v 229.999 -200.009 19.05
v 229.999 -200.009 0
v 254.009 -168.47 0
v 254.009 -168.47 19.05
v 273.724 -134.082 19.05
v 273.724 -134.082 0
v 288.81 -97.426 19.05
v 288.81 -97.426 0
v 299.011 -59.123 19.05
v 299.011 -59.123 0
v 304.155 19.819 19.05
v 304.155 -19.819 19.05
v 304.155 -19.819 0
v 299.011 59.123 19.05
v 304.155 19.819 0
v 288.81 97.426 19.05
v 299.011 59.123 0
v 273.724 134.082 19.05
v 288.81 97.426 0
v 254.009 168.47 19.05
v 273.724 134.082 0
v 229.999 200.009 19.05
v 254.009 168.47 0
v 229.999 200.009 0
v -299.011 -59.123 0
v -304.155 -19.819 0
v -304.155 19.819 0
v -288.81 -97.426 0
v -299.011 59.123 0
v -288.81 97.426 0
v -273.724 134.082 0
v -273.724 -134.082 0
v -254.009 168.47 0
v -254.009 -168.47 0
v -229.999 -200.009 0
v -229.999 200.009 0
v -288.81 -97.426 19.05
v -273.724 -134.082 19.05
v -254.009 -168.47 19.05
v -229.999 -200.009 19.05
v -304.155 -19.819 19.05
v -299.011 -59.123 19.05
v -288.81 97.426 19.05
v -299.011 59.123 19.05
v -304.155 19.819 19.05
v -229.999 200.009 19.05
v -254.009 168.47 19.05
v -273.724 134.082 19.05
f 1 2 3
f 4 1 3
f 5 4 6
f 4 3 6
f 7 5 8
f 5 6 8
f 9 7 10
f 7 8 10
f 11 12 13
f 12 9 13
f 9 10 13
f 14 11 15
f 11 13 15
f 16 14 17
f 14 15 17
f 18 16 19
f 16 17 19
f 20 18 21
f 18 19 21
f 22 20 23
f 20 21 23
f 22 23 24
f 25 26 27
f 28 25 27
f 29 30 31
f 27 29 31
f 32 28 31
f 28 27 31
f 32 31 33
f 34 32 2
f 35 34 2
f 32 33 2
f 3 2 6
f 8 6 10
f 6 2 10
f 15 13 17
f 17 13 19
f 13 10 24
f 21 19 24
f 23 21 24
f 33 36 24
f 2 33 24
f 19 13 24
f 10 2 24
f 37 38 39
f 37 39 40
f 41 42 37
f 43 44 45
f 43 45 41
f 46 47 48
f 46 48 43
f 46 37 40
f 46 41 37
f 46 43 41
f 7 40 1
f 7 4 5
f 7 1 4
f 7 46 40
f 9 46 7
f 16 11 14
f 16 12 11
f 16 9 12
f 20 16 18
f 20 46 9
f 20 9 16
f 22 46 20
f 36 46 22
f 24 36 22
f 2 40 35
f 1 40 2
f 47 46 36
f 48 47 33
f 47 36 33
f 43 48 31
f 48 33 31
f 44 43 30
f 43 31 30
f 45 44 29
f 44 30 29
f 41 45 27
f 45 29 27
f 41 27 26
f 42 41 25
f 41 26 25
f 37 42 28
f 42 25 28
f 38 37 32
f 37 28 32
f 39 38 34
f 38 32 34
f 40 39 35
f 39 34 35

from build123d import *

# Parameters (mm, degrees)
F0_R     = 304.8
F1_DEPTH = 19.05
F4_W     = 651.788891
F4_H     = 160.561264
F5_DEPTH = 25.4


with BuildPart() as f1:
    # F0 (on Top) → F1 (new body)
    with BuildSketch(Plane.XY):
        Circle(F0_R)
    extrude(amount=F1_DEPTH)

    # F4 (on face) → F5 (cut)
    with BuildSketch(Plane.XY.offset(19.05)):
        with Locations((-6.526291, -280.289799)):
            Rectangle(F4_W, F4_H)
        with Locations((-6.526291, 280.289799)):
            Rectangle(F4_W, F4_H)
    extrude(amount=-F5_DEPTH, mode=Mode.SUBTRACT)


with BuildPart() as f2_1:
    # F2: copy of F1
    add(f1.part.moved(Location((0, 0, -515.62))))


solid = f1.part
